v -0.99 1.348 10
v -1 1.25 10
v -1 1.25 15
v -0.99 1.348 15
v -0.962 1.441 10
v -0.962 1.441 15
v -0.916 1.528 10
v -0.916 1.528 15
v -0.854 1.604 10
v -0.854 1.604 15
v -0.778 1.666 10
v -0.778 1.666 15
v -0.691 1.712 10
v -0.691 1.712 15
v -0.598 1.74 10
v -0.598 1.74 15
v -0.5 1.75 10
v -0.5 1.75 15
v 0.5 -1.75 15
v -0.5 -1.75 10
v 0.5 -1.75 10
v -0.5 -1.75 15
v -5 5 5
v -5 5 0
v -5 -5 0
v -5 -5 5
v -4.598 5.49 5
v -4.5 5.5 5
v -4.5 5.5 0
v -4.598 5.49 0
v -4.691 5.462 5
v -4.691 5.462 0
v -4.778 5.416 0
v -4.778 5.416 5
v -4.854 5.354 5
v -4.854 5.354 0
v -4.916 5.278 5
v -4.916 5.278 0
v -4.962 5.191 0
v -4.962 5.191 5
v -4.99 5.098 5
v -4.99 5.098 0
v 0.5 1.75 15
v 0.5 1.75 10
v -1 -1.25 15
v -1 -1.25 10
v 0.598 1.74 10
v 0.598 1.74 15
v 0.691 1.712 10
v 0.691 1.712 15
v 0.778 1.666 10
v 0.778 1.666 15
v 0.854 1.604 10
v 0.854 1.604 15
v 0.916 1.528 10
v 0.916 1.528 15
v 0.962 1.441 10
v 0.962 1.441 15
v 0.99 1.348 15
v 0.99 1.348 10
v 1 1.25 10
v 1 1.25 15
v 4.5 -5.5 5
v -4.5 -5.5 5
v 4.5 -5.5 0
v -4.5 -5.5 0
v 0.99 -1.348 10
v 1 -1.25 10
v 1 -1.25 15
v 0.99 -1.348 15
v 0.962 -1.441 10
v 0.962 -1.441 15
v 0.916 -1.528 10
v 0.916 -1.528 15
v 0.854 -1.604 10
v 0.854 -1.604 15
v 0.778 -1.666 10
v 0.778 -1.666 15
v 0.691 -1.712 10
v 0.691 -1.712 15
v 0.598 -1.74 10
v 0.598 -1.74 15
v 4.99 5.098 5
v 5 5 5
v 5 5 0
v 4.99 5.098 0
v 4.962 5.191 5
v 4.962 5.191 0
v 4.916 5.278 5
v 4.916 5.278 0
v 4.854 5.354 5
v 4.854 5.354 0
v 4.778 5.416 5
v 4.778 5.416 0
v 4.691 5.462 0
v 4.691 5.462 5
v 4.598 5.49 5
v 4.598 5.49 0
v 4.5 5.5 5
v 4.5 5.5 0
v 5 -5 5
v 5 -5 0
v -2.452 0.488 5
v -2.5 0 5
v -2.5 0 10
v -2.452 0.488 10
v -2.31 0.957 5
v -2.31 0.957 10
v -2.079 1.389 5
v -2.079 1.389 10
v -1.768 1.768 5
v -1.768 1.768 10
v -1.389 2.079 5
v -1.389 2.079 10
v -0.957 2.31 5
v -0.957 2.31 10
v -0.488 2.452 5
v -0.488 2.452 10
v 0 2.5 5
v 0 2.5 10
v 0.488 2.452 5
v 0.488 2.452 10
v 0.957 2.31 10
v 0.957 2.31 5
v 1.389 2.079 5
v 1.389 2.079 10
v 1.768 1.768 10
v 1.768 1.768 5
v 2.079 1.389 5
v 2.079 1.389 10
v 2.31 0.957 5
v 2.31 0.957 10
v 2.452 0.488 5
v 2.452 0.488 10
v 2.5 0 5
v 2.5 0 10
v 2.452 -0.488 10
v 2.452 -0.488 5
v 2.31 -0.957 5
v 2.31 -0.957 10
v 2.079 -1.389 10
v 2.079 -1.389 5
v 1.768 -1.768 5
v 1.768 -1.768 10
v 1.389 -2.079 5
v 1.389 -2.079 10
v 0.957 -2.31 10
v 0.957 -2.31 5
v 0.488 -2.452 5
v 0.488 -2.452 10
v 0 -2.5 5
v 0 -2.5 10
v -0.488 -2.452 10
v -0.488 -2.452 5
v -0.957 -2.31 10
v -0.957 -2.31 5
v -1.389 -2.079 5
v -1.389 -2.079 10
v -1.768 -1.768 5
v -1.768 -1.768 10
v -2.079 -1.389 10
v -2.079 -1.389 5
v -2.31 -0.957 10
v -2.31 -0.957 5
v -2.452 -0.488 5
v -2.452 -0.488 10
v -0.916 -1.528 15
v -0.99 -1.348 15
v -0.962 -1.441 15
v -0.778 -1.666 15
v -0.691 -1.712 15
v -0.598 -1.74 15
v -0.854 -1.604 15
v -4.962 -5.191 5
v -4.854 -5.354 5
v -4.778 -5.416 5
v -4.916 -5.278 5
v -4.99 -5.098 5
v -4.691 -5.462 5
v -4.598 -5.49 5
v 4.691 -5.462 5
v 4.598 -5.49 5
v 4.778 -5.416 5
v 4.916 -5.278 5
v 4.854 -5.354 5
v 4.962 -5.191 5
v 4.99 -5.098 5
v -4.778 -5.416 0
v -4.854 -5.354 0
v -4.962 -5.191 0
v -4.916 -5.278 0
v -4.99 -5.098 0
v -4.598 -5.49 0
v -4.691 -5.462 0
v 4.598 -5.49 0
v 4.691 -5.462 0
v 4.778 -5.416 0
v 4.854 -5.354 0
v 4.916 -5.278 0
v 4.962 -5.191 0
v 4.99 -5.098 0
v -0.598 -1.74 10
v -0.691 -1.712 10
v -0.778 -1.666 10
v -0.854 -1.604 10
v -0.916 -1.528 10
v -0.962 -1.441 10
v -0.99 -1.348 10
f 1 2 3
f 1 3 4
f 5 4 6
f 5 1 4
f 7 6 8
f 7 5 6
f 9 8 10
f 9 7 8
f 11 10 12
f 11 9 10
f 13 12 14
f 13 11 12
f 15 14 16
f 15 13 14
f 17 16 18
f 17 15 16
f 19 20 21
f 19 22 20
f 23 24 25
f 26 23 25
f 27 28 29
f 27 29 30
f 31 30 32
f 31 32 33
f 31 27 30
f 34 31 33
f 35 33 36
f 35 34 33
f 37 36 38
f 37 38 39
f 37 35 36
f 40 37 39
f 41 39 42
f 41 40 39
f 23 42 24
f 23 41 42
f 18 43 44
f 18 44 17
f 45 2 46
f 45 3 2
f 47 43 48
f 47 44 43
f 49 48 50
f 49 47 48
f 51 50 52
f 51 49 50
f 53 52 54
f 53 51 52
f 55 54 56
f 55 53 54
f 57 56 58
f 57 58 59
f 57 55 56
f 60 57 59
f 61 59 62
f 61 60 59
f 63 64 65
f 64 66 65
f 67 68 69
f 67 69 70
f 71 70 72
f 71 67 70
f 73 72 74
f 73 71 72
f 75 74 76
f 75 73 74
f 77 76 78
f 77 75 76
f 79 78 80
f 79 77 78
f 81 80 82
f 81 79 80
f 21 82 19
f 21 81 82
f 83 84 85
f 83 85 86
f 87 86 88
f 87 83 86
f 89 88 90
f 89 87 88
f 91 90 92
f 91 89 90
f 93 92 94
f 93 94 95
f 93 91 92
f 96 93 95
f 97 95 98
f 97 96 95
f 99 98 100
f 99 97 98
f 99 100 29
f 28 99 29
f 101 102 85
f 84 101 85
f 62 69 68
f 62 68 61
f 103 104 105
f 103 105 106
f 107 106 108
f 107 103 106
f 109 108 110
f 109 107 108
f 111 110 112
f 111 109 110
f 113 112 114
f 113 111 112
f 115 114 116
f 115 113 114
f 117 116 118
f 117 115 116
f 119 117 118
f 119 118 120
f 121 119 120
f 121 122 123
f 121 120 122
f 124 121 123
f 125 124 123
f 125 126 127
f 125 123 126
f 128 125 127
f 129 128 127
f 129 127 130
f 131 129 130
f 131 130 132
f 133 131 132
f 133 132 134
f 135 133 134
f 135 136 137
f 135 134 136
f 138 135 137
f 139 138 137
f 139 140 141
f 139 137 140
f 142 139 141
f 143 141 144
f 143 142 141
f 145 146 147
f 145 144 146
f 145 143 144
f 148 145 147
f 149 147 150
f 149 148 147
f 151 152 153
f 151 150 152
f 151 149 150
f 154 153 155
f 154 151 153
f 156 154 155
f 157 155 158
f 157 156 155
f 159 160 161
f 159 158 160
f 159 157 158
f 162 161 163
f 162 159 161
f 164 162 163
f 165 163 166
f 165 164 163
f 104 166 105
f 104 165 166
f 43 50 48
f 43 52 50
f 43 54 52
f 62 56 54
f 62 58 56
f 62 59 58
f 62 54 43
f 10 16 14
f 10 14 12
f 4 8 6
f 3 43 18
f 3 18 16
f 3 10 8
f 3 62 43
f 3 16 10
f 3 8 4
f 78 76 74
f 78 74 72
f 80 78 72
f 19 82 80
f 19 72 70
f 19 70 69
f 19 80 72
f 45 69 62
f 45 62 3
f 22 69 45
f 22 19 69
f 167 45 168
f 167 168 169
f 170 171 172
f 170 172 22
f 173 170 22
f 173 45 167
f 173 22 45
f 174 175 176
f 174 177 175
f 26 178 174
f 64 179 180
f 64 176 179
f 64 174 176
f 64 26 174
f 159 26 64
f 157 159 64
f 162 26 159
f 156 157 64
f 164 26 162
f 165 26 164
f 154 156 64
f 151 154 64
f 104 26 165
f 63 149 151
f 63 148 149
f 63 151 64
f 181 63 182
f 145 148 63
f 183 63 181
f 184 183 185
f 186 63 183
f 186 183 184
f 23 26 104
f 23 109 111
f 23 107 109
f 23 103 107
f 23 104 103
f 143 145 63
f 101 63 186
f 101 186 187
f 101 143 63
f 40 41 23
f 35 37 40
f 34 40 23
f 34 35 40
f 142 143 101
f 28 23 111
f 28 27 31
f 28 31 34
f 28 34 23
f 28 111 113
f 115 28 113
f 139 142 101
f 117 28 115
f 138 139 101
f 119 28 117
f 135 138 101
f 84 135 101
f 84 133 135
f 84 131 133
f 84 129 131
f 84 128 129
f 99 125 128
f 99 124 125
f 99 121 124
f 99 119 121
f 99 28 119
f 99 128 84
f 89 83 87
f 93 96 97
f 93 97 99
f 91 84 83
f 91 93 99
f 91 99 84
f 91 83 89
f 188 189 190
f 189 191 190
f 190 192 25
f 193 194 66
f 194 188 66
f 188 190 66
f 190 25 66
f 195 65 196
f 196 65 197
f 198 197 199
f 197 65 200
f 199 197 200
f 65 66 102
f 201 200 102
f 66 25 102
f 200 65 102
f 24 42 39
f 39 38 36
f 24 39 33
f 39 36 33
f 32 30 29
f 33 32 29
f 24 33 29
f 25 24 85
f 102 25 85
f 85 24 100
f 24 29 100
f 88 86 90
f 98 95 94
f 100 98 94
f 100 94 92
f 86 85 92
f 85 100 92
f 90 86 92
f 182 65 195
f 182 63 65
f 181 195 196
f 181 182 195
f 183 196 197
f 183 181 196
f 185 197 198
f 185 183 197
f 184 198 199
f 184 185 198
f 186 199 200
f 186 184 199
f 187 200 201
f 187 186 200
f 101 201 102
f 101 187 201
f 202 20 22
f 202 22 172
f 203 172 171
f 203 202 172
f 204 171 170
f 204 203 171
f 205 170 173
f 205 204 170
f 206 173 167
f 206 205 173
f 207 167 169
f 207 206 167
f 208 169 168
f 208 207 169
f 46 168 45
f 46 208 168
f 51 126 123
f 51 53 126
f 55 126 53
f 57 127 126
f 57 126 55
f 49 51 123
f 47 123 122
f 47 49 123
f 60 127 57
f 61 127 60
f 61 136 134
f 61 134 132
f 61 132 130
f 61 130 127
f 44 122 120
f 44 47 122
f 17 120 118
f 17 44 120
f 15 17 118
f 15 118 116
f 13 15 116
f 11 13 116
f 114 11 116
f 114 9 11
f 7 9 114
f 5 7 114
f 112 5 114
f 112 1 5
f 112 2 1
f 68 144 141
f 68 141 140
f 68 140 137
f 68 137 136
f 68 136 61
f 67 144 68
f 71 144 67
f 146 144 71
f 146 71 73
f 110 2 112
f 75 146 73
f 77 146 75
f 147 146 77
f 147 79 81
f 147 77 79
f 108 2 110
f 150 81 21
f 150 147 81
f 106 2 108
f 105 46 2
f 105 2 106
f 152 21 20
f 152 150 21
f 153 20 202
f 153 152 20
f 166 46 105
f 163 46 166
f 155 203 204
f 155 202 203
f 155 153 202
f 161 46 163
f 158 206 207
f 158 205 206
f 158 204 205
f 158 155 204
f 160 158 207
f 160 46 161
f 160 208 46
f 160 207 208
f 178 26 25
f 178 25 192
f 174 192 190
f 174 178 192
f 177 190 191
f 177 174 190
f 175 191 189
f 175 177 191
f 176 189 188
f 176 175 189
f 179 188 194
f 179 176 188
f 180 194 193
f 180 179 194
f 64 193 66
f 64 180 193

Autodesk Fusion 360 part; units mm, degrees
sketch "Sketch1" plane through (0, 0, 0) normal (0, 0, 1) x (1, 0, 0)
  line L0 (5, 5.5) -> (-5, 5.5)
  line L1 (-5, 5.5) -> (-5, -5.5)
  line L2 (-5, -5.5) -> (5, -5.5)
  line L3 (5, -5.5) -> (5, 5.5)
  line L4 (5, 5.5) -> (-5, -5.5) construction
  line L5 (-5, 5.5) -> (5, -5.5) construction
  dimension "d1" = 10
  dimension "d2" = 11
extrude "Extrude1" add sketch "Sketch1" along normal blind 5
sketch "Sketch2" plane through (0, 0, 5) normal (0, 0, 1) x (-1, 0, 0)
  line L0 (-5, 5.5) -> (-5, -5.5)
  line L1 (-5, -5.5) -> (5, -5.5)
  line L2 (5, -5.5) -> (5, 5.5)
  line L3 (5, 5.5) -> (-5, 5.5)
  circle A0 centre (0, 0) radius 2.5
  dimension "d5" = 5
extrude "Extrude2" add sketch "Sketch2" along normal blind 10 contours A0
sketch "Sketch3" plane through (0, 0, 15) normal (0, 0, 1) x (-1, 0, 0)
  circle A0 centre (0, 0) radius 2.5
  line L0 (-1, -1.75) -> (1, -1.75)
  line L1 (1, -1.75) -> (1, 1.75)
  line L2 (1, 1.75) -> (-1, 1.75)
  line L3 (-1, 1.75) -> (-1, -1.75)
  line L4 (-1, -1.75) -> (1, 1.75) construction
  line L5 (1, -1.75) -> (-1, 1.75) construction
  dimension "d8" = 2
  dimension "d9" = 3.5
extrude "Extrude3" cut sketch "Sketch3" against normal blind 5
fillet "Fillet1" radius 0.5 4 edges at (-1, -1.75, 12.5) (1, -1.75, 12.5) (-1, 1.75, 12.5) (1, 1.75, 12.5)
fillet "Fillet2" radius 0.5 4 edges at (-5, 5.5, 2.5) (5, 5.5, 2.5) (-5, -5.5, 2.5) (5, -5.5, 2.5)
